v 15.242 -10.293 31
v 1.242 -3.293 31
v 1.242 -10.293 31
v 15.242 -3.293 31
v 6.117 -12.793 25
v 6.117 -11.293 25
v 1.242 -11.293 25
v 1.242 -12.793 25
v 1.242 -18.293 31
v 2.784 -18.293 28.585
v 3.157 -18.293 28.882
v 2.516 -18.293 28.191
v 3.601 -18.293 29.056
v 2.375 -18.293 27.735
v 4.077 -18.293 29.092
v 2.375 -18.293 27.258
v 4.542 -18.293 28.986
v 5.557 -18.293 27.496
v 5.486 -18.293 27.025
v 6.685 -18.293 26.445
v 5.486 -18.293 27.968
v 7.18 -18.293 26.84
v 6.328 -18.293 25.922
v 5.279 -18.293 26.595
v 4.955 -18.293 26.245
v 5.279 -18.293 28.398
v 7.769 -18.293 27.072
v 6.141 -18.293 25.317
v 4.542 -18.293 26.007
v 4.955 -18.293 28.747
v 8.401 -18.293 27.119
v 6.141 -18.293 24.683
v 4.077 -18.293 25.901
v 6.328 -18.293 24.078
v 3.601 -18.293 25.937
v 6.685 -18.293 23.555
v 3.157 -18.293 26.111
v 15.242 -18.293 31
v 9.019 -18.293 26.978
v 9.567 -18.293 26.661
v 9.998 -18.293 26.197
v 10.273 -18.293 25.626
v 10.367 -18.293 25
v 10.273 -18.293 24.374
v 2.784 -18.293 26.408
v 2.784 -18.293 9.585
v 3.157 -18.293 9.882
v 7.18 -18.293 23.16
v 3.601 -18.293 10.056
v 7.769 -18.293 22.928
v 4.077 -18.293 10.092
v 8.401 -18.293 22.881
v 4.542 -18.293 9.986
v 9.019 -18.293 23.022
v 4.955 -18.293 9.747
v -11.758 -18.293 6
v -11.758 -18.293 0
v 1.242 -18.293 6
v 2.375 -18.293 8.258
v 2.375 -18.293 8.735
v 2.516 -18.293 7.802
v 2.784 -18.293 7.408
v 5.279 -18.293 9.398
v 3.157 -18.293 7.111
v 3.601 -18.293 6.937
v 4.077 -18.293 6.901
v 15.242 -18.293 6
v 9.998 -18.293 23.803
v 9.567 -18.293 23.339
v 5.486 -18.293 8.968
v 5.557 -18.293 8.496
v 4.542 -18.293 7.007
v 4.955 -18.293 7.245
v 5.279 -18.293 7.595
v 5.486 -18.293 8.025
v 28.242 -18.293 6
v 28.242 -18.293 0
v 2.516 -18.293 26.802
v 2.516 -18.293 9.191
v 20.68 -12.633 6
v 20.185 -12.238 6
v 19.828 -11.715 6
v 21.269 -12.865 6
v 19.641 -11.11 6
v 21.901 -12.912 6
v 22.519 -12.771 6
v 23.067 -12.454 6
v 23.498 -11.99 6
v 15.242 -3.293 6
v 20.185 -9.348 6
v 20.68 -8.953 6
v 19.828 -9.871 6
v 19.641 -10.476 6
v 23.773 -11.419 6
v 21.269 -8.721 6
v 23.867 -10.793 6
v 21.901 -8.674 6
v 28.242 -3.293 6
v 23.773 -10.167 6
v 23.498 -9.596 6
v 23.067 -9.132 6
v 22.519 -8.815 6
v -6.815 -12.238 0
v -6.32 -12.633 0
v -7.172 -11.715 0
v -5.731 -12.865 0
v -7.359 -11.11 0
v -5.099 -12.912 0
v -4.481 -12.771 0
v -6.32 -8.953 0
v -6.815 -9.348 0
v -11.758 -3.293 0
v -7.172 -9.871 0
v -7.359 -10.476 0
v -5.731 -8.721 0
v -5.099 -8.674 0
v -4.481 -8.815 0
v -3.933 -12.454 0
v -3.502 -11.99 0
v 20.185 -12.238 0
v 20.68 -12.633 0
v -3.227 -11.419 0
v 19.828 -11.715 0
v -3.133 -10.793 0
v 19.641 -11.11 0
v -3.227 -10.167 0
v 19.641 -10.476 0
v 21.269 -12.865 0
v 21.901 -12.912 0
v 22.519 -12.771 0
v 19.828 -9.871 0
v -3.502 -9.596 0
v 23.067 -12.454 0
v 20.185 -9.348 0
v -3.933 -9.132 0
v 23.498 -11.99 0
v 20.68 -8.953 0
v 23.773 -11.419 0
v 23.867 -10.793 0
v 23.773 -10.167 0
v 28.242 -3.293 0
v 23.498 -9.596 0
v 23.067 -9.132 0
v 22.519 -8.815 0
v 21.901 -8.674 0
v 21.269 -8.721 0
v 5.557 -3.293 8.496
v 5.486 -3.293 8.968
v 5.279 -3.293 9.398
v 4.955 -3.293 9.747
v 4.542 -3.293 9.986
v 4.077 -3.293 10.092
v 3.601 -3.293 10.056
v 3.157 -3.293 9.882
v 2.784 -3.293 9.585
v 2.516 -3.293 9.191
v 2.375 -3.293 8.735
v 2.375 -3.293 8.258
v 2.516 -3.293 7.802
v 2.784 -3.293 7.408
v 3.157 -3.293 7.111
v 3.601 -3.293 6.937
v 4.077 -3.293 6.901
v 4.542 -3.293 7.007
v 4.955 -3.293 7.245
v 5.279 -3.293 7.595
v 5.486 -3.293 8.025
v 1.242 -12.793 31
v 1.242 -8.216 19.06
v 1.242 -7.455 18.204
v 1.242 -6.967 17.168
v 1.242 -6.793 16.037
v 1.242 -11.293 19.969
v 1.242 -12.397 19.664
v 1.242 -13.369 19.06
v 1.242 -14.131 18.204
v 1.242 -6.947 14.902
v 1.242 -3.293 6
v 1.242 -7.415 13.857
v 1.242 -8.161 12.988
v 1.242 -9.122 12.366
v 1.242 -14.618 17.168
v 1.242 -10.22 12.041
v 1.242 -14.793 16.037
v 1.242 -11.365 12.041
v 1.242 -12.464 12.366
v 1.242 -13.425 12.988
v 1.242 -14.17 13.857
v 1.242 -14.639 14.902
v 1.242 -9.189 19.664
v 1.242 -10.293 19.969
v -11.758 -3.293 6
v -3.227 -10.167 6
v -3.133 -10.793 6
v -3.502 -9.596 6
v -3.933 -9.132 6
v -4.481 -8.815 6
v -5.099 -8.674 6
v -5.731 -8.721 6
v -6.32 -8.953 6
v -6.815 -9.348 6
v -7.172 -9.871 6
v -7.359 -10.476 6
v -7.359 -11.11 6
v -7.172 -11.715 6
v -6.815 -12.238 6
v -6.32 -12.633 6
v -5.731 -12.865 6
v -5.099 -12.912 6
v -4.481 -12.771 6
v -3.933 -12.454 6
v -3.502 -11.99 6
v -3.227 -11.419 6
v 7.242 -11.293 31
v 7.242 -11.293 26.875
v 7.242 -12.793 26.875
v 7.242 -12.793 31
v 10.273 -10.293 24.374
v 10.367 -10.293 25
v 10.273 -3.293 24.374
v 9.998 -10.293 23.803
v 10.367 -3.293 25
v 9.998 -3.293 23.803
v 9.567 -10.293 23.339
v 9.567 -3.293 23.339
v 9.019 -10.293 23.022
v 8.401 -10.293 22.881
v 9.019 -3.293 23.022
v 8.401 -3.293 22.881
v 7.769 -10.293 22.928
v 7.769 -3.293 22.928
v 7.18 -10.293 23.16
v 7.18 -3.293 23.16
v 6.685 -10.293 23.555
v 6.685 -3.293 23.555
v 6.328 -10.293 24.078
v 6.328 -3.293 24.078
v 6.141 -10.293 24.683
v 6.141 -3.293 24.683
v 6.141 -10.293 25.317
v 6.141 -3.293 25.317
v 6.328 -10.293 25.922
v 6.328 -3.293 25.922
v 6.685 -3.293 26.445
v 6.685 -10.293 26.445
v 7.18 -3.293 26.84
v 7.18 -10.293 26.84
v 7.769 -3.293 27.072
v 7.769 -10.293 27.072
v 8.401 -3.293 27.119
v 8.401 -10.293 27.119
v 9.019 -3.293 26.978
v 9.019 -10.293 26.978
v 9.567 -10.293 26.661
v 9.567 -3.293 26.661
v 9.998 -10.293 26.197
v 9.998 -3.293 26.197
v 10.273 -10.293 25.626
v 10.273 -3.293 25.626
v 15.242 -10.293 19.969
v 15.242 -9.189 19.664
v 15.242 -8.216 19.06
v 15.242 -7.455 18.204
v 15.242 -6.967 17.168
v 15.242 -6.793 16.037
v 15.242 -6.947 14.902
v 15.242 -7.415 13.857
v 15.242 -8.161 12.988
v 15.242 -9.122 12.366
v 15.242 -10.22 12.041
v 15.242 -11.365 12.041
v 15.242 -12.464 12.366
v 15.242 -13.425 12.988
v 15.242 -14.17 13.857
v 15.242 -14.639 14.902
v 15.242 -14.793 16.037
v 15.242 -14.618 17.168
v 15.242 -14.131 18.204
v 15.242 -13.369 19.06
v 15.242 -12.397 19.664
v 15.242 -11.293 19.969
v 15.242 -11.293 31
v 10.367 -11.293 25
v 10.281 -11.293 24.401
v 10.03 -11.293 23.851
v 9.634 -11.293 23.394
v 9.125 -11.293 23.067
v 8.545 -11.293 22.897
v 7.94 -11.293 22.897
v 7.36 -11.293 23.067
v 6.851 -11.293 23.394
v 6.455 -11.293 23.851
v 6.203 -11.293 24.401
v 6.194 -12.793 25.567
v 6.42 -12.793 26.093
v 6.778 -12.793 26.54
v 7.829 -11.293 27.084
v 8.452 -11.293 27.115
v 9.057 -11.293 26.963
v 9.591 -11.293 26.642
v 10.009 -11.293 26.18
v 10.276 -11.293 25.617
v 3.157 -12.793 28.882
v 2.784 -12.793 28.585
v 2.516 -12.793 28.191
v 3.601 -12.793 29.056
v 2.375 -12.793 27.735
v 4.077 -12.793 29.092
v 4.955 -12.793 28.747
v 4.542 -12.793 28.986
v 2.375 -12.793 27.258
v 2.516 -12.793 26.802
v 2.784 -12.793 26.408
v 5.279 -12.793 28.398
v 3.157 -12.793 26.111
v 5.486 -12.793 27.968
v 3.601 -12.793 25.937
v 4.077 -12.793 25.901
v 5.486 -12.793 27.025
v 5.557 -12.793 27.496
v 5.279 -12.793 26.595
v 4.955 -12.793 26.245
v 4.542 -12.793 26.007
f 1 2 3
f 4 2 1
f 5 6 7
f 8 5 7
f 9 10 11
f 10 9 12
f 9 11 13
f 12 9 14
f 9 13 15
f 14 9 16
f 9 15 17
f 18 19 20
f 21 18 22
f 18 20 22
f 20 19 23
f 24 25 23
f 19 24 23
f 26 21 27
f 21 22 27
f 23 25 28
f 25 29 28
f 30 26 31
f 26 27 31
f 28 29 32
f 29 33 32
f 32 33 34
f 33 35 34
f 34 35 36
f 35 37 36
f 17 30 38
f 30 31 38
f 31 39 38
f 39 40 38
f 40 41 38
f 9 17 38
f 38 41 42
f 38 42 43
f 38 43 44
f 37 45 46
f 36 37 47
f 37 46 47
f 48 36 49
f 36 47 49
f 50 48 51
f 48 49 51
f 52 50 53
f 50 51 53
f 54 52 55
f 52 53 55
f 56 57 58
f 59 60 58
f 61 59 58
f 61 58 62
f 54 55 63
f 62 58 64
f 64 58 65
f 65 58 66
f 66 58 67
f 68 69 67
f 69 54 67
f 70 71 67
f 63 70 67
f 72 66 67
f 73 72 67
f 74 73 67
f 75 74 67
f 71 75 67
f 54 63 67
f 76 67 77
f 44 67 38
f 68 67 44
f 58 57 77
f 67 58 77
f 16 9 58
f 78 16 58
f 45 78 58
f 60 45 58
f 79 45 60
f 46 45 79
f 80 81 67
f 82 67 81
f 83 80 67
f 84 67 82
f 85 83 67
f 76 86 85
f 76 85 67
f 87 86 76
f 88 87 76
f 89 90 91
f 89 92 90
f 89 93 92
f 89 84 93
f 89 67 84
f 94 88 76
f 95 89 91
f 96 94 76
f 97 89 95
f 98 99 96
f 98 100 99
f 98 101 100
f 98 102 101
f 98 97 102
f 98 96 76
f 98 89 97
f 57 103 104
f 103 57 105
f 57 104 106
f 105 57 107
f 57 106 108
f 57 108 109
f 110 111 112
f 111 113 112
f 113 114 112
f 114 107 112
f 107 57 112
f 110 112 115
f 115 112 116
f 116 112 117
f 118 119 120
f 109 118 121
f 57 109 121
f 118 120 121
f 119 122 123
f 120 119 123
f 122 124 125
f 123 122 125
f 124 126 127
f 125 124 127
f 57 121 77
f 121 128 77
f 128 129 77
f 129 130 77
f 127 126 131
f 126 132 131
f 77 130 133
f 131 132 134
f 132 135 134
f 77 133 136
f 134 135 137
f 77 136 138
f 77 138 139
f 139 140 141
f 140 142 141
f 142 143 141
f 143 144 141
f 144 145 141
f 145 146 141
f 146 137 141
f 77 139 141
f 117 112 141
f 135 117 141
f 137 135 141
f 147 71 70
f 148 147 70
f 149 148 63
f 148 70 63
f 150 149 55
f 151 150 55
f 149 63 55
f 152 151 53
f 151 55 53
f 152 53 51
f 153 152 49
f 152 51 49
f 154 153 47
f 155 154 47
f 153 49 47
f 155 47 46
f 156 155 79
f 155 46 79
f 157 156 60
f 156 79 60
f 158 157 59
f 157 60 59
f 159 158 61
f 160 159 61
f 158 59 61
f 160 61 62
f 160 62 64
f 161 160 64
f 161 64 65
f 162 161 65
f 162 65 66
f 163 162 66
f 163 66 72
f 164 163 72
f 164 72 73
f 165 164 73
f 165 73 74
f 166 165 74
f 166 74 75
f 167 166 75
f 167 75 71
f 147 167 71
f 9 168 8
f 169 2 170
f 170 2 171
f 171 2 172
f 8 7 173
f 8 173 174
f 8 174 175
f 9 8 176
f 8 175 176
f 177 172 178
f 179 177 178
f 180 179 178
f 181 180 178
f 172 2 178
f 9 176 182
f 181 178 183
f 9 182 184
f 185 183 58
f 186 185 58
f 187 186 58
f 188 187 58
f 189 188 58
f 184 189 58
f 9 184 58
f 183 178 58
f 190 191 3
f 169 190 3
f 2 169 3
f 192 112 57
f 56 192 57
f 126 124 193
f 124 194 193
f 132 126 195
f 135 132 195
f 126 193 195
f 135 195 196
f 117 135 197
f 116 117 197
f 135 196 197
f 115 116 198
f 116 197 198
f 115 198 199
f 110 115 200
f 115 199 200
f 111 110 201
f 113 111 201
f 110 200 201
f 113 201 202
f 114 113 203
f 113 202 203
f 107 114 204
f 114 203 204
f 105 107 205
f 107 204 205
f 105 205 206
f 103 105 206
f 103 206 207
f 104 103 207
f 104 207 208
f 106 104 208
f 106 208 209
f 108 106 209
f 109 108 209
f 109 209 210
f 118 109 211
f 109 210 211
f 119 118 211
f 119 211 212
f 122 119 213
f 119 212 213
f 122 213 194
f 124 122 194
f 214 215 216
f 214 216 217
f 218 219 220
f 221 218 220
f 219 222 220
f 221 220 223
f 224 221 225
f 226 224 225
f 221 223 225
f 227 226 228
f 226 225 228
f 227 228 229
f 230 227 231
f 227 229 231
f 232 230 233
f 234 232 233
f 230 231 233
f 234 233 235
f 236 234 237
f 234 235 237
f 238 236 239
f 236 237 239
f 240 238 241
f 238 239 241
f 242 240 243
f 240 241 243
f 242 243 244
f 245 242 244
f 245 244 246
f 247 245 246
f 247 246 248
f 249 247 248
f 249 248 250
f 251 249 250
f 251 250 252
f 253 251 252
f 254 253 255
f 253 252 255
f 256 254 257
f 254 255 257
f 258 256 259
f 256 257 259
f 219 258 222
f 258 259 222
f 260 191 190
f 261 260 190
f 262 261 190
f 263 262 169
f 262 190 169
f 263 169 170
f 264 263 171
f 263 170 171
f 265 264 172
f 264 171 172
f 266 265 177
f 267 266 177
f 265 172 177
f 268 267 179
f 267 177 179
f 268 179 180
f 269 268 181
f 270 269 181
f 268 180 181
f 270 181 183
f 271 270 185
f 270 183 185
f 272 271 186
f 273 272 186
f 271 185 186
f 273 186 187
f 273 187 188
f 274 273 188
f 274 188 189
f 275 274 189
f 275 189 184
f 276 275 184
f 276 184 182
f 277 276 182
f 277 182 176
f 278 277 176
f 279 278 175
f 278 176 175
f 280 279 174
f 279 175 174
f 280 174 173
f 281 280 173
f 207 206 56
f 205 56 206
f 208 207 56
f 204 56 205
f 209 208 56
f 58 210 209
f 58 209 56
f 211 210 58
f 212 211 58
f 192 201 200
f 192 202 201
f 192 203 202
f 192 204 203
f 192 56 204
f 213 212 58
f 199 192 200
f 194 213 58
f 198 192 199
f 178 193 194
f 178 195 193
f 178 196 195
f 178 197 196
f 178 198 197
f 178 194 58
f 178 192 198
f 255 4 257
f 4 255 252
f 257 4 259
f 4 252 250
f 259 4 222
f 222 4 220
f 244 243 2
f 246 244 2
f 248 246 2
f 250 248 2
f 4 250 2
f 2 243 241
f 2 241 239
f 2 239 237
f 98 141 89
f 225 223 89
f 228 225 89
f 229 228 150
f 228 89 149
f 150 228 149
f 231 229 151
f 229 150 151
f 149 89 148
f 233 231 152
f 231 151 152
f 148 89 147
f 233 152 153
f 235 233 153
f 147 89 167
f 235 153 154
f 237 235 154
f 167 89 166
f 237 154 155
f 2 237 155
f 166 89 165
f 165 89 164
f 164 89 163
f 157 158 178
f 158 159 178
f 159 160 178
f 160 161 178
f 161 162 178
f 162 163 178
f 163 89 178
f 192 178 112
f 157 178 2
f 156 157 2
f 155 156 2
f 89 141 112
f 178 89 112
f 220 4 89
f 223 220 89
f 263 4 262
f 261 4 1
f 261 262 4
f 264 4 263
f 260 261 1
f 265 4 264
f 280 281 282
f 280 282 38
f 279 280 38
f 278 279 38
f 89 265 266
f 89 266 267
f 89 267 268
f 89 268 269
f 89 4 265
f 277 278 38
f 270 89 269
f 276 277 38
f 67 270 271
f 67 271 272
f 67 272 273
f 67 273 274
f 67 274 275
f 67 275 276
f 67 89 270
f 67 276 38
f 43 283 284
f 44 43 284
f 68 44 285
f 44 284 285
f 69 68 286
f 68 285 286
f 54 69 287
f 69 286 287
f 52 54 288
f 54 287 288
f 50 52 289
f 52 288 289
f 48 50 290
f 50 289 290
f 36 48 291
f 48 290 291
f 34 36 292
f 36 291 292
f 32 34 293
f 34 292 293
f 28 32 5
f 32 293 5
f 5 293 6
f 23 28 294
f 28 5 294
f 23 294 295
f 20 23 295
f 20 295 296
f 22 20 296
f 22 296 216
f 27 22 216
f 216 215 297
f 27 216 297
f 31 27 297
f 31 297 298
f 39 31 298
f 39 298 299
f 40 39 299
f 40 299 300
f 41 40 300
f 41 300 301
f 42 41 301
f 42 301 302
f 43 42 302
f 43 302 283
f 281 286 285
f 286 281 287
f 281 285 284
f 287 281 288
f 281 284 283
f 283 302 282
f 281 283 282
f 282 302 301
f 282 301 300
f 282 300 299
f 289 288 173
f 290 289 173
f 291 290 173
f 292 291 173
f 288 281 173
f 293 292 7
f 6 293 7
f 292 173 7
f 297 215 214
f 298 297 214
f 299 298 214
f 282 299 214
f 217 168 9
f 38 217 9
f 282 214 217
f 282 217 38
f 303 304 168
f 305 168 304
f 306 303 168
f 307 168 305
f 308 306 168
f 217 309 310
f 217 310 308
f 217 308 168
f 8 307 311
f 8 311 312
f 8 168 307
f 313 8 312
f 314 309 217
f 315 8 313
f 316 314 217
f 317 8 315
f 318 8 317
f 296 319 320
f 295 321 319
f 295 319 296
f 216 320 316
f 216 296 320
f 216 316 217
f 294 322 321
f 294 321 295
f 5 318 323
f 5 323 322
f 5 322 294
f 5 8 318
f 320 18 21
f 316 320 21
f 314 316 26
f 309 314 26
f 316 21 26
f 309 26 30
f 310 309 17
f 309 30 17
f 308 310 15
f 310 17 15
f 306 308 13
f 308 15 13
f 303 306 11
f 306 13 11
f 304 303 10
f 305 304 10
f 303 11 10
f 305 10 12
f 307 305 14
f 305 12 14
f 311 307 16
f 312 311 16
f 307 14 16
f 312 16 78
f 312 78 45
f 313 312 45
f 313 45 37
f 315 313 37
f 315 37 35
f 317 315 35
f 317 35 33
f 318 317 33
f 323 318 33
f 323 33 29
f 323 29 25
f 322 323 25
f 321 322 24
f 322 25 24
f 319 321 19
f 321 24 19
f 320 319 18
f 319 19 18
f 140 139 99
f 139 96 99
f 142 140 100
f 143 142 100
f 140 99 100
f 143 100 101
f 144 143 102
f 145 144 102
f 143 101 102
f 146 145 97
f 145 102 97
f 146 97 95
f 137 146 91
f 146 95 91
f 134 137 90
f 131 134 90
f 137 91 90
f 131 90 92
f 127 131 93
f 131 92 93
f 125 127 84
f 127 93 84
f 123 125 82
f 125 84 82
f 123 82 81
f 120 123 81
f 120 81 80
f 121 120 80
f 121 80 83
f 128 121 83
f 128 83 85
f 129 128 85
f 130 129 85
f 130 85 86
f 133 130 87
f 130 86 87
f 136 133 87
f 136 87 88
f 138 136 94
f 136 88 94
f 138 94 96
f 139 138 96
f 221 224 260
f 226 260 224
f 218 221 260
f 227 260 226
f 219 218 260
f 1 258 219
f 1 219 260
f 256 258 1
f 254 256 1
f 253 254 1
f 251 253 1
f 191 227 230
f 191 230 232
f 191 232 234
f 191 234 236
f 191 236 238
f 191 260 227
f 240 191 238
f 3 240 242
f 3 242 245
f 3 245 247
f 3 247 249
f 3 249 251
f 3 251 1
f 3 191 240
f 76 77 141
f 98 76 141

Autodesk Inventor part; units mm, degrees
ref_plane "YZ Plane" through (0, 0, 0) normal (1, 0, 0) x (0, 1, 0)
ref_plane "XZ Plane" through (0, 0, 0) normal (0, 1, 0) x (-1, 0, 0)
ref_plane "XY Plane" through (0, 0, 0) normal (0, 0, 1) x (1, 0, 0)
sketch "Sketch1" plane through (0, 0, 0) normal (0, 0, 1) x (1, 0, 0)
  line L0 (-11.7577, -18.2929) -> (28.2423, -18.2929)
  line L1 (28.2423, -18.2929) -> (28.2423, -3.2929)
  line L2 (28.2423, -3.2929) -> (-11.7577, -3.2929)
  line L3 (-11.7577, -3.2929) -> (-11.7577, -18.2929)
  point P0 (0, 0)
  dimension "d0" = 40
  dimension "d1" = 15
extrude "Extrusion1" add sketch "Sketch1" along normal blind 6
sketch "Sketch2" plane through (0, 0, 6) normal (0, 0, 1) x (1, 0, 0)
  line L0 (28.2423, -3.2929) -> (-11.7577, -3.2929) projected
  line L1 (15.2423, -3.2929) -> (15.2423, -18.2929)
  line L2 (1.2423, -3.2929) -> (1.2423, -18.2929)
  line L3 (-11.7577, -18.2929) -> (28.2423, -18.2929) projected
  line L4 (15.2423, -6.7382) -> (28.2423, -6.7382) construction
  line L5 (28.2423, -18.2929) -> (28.2423, -3.2929) projected
  line L6 (1.2423, -6.7382) -> (-11.7577, -6.7382) construction
  line L7 (-11.7577, -3.2929) -> (-11.7577, -18.2929) projected
  point P0 (0, 0)
  dimension "d4" = 14
extrude "Extrusion2" add sketch "Sketch2" along normal blind 25 contours L1 L3 L2 L0
sketch "Sketch4" plane through (0, 0, 6) normal (0, 0, 1) x (1, 0, 0)
  circle A0 centre (21.7423, -10.7929) radius 2.125
  line L0 (21.7423, -10.7929) -> (21.7423, -3.2929) construction
  line L1 (21.7423, -10.7929) -> (21.7423, -18.2929) construction
  line L2 (15.2423, -18.2929) -> (28.2423, -18.2929) projected
  line L3 (21.7423, -10.7929) -> (28.2423, -10.7929) construction
  line L4 (21.7423, -10.7929) -> (15.2423, -10.7929) construction
  line L5 (15.2423, -18.2929) -> (15.2423, -3.2929) projected
  line L6 (28.2423, -3.2929) -> (15.2423, -3.2929) projected
  line L7 (28.2423, -18.2929) -> (28.2423, -3.2929) projected
  circle A1 centre (-5.2577, -10.7929) radius 2.125
  line L8 (-5.2577, -10.7929) -> (-5.2577, -3.2929) construction
  line L9 (-5.2577, -10.7929) -> (-11.7577, -10.7929) construction
  line L10 (-11.7577, -3.2929) -> (-11.7577, -18.2929) projected
  line L11 (-5.2577, -10.7929) -> (-5.2577, -18.2929) construction
  line L12 (-5.2577, -10.7929) -> (1.2423, -10.7929) construction
  line L13 (1.2423, -3.2929) -> (1.2423, -18.2929) projected
  point P0 (0, 0)
  dimension "d12" = 4.25
  dimension "d13" = 4.25
extrude "Extrusion4" cut sketch "Sketch4" against normal up to next contours A0 | A1
sketch "Sketch5" plane through (1.2423, -18.2929, 6) normal (-1, 0, 0) x (0, 0, 1)
  circle A0 centre (10, 7.5) radius 4
  line L0 (10, 7.5) -> (10, 15) construction
  line L1 (10, 7.5) -> (10, 0) construction
  line L2 (-6, 15) -> (-6, 0) projected
  line L3 (13.9686, 7) -> (25, 7)
  line L4 (13.9686, 8) -> (25, 8)
  line L5 (25, 15) -> (25, 0) projected
  line L6 (27.4068, 8) -> (27.4068, 15) construction
  line L7 (27.4068, 7) -> (27.4068, 0) construction
  line L8 (0, 0) -> (25, 0) projected
  line L9 (0, 15) -> (25, 15) projected
  line L10 (10, 7.5) -> (10, 0) construction
  line L11 (0, 0) -> (25, 0) projected
  point P0 (-6, 18.2929)
  dimension "d16" = 8
  dimension "d17" = 16
  dimension "d18" = 1
extrude "Extrusion5" cut sketch "Sketch5" against normal up to next
sketch "Sketch6" plane through (-11.7577, -3.2929, 0) normal (0, 1, 0) x (1, 0, 0)
  circle A0 centre (20, -25) radius 2.125
  line L0 (27, -31) -> (13, -31) projected
  line L1 (20, -25) -> (27, -25) construction
  line L2 (20, -25) -> (13, -25) construction
  line L3 (27, -6) -> (27, -31) projected
  line L4 (13, -6) -> (13, -31) projected
  point P0 (11.7577, 0)
  dimension "d21" = 4.25
  dimension "d22" = 6
extrude "Extrusion6" cut sketch "Sketch6" against normal through all
sketch "Sketch7" plane through (-11.7577, -18.2929, 0) normal (0, -1, 0) x (1, 0, 0)
  circle A0 centre (20, 25) radius 2.125 projected
  circle A1 centre (20, 25) radius 5
  point P0 (11.7577, 0)
  dimension "d25" = 10
sketch "Sketch8" plane through (-11.7577, -18.2929, 0) normal (0, -1, 0) x (1, 0, 0)
  circle A0 centre (15.7148, 27.4964) radius 1.6 projected
  circle A1 centre (15.7148, 8.4964) radius 1.6 projected
  circle A2 centre (15.7148, 27.4964) radius 1.6
  circle A3 centre (15.7148, 8.4964) radius 1.6
  point P0 (11.7577, 0)
extrude "Extrusion8" cut sketch "Sketch8" against normal up to next contours A0
extrude "Extrusion9" cut sketch "Sketch8" against normal up to surface (15 mm away) contours A1
sketch "Sketch9" plane through (0, 0, 31) normal (0, 0, 1) x (1, 0, 0)
  point P0 (0, 0)
sketch "Sketch10" plane through (1.2423, -11.2929, 31) normal (0, 1, 0) x (1, 0, 0)
  line L0 (6, 6) -> (6, 0)
  line L1 (14, 0) -> (0, 0) projected
  line L2 (6, 0) -> (0, 0)
  line L3 (0, 11.0314) -> (14, 11.0314) projected
  line L4 (0, 11.0314) -> (0, 19) projected
  line L5 (6, 6) -> (0, 6)
  line L6 (0, 0) -> (0, 11.0314) projected
  line L7 (0, 0) -> (0, 6)
  point P0 (-1.2423, 31)
  dimension "d32" = 6
  dimension "d35" = 6
extrude "Extrusion10" cut sketch "Sketch10" against normal blind 1.5
properties part number "YRodClampWithEndstop"
